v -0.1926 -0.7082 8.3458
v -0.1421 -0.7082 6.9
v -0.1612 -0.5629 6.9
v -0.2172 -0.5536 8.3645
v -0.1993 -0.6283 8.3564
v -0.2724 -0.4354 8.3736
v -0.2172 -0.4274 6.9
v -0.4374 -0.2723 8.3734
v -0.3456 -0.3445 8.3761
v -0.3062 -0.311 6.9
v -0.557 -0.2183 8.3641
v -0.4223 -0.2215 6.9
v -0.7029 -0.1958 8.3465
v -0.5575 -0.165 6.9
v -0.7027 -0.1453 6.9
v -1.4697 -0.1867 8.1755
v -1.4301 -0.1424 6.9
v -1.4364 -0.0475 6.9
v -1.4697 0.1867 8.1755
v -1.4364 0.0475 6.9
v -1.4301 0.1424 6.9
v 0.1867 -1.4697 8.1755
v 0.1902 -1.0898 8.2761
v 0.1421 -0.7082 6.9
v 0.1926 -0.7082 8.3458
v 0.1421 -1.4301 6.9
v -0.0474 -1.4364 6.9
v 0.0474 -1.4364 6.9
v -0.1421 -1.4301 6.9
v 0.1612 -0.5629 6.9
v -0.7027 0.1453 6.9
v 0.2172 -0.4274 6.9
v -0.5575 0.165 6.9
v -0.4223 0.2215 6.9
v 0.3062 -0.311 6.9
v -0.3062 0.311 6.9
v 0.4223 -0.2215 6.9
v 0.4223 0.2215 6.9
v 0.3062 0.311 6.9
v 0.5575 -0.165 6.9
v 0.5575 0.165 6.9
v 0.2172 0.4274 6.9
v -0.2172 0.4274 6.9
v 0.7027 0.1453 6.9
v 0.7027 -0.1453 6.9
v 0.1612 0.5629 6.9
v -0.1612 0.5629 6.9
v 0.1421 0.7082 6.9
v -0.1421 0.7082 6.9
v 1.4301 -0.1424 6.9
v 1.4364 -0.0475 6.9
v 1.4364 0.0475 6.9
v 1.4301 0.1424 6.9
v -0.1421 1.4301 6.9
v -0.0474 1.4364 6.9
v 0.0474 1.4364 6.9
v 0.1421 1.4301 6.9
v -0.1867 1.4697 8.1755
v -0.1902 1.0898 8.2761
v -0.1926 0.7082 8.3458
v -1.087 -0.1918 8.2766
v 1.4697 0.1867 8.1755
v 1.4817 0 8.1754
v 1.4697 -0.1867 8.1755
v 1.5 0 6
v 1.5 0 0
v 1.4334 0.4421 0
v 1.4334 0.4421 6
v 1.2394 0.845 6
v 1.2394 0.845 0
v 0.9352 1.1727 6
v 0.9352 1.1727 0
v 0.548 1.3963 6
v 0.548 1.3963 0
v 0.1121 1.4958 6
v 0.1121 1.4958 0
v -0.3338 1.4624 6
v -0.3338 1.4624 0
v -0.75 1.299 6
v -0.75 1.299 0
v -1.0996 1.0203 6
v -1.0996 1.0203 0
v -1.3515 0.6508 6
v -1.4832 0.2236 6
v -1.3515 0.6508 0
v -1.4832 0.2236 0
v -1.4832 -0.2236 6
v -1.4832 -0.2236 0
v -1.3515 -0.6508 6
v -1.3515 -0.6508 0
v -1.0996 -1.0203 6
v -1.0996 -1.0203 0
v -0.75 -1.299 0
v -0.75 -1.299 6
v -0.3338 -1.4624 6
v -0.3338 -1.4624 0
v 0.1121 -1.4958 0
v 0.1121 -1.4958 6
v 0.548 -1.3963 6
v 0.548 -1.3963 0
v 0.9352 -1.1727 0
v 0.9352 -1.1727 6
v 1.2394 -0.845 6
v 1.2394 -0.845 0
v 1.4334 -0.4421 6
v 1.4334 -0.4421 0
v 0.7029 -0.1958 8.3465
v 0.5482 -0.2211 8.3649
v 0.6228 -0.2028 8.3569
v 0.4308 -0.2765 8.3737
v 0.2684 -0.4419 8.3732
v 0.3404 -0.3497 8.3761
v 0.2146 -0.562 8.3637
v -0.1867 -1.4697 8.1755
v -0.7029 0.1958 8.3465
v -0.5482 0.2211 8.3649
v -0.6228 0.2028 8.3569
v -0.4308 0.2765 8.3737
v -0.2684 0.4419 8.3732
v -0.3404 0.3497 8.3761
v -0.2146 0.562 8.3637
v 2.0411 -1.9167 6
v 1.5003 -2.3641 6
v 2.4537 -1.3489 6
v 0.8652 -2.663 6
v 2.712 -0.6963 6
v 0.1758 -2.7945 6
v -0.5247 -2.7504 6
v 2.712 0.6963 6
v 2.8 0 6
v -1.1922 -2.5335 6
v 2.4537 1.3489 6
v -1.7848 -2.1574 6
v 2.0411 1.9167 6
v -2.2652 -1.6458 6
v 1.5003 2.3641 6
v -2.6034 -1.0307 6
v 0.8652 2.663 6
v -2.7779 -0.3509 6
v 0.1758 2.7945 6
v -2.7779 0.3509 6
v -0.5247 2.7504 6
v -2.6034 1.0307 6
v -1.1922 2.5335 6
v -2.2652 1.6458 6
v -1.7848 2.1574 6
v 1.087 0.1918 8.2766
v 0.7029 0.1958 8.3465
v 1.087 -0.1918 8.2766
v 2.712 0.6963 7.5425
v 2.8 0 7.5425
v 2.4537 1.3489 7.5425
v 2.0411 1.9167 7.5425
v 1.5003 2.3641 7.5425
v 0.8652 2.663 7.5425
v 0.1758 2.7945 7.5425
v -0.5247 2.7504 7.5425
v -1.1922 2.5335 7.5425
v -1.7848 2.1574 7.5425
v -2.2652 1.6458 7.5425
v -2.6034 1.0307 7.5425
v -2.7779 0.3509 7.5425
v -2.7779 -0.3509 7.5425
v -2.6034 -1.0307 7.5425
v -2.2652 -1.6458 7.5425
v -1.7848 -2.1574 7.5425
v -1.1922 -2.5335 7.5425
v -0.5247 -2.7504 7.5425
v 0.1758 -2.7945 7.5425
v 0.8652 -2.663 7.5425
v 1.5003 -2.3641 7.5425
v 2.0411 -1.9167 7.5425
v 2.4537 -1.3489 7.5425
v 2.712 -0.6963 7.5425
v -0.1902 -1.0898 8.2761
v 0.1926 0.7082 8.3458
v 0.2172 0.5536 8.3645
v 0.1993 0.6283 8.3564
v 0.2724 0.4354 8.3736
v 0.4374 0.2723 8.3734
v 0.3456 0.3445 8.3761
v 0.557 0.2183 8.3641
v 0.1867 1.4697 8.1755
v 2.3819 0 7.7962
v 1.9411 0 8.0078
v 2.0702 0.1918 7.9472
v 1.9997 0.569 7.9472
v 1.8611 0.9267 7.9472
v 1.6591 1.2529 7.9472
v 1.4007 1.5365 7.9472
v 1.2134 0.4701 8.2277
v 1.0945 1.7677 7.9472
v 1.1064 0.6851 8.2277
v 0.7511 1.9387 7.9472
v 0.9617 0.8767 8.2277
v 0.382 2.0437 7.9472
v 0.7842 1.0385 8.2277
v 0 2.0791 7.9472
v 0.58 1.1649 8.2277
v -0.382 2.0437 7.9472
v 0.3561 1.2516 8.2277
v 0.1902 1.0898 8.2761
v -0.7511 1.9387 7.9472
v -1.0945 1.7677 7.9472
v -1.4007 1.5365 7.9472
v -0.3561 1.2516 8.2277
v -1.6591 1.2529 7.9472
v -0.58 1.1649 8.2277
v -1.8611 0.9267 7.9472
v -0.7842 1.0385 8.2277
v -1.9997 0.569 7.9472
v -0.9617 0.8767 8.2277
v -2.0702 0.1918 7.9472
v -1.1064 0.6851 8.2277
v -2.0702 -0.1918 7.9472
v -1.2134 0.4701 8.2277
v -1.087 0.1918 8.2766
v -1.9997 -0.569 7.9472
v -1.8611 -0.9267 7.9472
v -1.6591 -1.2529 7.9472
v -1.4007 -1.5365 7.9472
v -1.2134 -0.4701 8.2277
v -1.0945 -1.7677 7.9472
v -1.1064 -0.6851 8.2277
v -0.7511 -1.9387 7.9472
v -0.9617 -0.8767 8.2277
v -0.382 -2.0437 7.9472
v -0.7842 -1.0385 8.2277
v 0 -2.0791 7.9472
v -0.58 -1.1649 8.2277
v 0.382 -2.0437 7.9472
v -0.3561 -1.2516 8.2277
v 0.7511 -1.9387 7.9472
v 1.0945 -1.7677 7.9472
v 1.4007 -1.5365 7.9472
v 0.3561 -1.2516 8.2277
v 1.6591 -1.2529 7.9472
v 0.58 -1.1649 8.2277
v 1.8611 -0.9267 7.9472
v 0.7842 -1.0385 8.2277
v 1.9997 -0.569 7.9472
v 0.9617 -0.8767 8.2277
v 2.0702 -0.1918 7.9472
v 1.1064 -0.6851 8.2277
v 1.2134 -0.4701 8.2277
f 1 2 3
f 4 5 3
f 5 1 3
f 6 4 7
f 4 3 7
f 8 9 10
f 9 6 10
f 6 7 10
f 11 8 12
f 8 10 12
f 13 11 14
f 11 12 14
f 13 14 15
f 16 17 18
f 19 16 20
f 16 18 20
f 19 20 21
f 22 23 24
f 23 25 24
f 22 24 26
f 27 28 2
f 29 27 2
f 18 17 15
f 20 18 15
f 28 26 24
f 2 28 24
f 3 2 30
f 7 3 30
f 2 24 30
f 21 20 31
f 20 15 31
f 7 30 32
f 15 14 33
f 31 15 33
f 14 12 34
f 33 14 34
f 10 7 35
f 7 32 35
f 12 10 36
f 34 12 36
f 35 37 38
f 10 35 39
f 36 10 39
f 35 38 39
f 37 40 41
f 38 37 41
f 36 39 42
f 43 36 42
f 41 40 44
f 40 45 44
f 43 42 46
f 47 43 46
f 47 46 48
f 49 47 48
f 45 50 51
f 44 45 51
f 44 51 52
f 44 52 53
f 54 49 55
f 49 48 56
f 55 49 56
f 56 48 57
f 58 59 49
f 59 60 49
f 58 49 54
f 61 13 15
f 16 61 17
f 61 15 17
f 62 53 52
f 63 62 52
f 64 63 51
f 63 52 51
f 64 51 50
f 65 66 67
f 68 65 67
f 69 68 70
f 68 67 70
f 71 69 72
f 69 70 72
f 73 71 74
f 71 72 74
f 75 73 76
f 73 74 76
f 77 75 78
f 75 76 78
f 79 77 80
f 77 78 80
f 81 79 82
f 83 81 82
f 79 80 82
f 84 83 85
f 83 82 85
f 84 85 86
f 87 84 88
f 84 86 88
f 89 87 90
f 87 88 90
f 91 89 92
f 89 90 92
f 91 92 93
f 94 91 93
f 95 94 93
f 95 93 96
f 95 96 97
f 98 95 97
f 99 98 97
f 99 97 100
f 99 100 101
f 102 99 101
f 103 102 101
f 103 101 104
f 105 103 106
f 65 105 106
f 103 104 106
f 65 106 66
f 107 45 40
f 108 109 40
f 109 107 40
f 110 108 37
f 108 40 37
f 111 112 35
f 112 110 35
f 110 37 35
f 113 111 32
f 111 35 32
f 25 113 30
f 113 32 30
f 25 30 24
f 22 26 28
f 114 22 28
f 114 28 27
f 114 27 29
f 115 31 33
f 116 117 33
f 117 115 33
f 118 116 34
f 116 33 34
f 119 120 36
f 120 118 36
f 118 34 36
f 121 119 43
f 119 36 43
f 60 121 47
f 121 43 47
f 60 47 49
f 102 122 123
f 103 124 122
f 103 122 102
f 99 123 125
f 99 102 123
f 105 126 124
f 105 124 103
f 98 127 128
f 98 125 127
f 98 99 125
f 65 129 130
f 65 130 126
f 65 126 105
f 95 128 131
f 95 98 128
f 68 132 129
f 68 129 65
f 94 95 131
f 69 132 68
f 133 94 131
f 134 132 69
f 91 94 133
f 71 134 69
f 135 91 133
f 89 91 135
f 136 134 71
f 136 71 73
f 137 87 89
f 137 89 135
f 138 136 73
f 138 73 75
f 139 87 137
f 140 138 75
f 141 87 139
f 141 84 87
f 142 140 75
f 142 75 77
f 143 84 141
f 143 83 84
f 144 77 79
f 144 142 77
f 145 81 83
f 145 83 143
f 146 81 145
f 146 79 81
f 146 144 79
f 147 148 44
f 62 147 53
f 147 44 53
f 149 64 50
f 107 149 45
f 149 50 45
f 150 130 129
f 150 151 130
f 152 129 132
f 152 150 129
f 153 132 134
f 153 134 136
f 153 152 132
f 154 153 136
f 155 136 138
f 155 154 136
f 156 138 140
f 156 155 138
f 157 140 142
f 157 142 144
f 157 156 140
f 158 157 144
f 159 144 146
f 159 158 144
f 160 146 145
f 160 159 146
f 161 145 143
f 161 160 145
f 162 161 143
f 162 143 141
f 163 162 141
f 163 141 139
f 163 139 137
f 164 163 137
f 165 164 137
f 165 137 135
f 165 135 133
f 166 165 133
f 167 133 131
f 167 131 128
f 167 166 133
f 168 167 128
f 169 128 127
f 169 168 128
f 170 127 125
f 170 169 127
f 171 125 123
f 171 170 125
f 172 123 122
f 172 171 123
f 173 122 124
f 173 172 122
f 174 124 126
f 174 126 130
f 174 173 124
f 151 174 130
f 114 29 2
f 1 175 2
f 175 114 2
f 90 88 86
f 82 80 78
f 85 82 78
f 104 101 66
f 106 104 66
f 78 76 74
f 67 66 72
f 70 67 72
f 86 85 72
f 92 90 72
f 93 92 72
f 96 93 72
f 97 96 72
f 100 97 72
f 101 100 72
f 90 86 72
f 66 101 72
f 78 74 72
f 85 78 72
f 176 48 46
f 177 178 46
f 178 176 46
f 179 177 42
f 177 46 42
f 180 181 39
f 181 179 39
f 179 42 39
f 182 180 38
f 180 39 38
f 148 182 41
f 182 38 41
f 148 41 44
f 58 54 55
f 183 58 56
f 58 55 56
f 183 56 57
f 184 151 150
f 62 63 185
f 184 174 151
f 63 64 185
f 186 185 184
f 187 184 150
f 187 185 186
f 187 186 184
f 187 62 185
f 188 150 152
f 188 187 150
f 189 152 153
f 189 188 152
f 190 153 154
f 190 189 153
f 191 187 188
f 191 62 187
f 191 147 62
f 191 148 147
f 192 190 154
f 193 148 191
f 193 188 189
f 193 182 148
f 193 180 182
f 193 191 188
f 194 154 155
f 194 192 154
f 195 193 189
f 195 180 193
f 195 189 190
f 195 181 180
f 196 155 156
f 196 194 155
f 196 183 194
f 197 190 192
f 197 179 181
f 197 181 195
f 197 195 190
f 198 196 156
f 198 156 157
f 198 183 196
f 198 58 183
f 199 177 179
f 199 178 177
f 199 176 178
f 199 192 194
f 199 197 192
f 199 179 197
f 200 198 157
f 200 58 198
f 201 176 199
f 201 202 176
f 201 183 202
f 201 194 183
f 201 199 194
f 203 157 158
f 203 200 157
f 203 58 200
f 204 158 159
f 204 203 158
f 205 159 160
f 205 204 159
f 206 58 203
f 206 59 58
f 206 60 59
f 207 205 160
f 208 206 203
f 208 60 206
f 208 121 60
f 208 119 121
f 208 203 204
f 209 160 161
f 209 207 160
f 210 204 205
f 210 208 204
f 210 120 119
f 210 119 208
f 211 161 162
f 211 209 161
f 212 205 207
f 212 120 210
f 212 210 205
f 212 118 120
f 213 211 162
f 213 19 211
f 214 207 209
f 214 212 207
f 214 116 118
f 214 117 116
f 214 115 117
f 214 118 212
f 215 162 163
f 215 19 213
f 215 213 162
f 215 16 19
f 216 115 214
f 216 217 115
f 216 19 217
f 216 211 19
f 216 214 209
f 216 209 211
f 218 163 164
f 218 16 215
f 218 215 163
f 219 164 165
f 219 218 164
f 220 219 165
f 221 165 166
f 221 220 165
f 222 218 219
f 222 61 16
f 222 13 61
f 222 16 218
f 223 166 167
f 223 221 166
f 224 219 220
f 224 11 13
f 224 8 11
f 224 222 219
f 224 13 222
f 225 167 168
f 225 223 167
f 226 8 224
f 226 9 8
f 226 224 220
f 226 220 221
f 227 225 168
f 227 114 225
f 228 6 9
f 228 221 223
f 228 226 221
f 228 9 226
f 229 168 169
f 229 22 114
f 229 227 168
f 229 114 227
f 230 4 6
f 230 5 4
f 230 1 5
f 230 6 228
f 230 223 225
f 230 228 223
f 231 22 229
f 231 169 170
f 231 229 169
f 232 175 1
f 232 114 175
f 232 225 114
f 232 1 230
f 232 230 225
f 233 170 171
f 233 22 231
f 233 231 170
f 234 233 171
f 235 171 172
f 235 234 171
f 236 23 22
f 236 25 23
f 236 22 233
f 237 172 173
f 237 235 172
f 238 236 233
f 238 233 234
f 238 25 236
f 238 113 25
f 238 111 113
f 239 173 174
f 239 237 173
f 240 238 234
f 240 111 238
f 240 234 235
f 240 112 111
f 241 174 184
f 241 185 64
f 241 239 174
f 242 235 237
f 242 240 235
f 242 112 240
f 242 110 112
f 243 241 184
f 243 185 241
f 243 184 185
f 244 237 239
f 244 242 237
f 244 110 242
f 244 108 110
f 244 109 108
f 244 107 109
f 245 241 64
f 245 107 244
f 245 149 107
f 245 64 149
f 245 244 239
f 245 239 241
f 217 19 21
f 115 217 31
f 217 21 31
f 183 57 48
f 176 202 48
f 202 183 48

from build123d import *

# Parameters (mm, degrees)
SKETCH1_R          = 1.5
BASE_EXTRUDE_DEPTH = 6
CUT_EXTRUDE1_DEPTH = 1.799999969
CUT_EXTRUDE1_TAPER = 2


with BuildPart() as part:
    # Sketch1 → Base-Extrude (new body)
    with BuildSketch(Plane.XY):
        Circle(SKETCH1_R)
    extrude(amount=BASE_EXTRUDE_DEPTH)

    # Sketch6 → Boss-Revolve2 (revolve)
    with BuildSketch(Plane(origin=(0, 0, 0), x_dir=(1, 0, 0), z_dir=(0, 1, 0))):
        with BuildLine():
            Line((0, -6), (2.7999999, -6))
            Line((2.7999999, -6), (2.7999999, -7.54246308))
            ThreePointArc((2.7999999, -7.54246308), (1.46418655, -8.180811406), (0, -8.4))
            Line((0, -8.4), (0, -6))
        make_face()
    revolve(axis=Axis((0, 0, -0.393620135), (0, 0, 1)))

    # Sketch7 → Cut-Extrude1 (cut)
    with BuildSketch(Plane(origin=(0, 0, 8.7000001), x_dir=(-1, 0, 0), z_dir=(0, 0, -1))):
        with BuildLine():
            ThreePointArc((0.205000004, 1.48592565), (0, 1.500000013), (-0.205000004, 1.48592565))
            Line((-0.205000004, 1.48592565), (-0.205000004, 0.708178558))
            ThreePointArc((-0.205000004, 0.708178558), (-0.35072876, 0.355344481), (-0.702967546, 0.208182689))
            Line((-0.702967546, 0.208182689), (-1.48592565, 0.205000004))
            ThreePointArc((-1.48592565, 0.205000004), (-1.500000013, 0), (-1.48592565, -0.205000004))
            Line((-1.48592565, -0.205000004), (-0.702967546, -0.208182689))
            ThreePointArc((-0.702967546, -0.208182689), (-0.35072876, -0.355344481), (-0.205000004, -0.708178558))
            Line((-0.205000004, -0.708178558), (-0.205000004, -1.48592565))
            ThreePointArc((-0.205000004, -1.48592565), (0, -1.500000013), (0.205000004, -1.48592565))
            Line((0.205000004, -1.48592565), (0.205000004, -0.708178558))
            ThreePointArc((0.205000004, -0.708178558), (0.35072876, -0.355344481), (0.702967546, -0.208182689))
            Line((0.702967546, -0.208182689), (1.48592565, -0.205000004))
            ThreePointArc((1.48592565, -0.205000004), (1.500000013, 0), (1.48592565, 0.205000004))
            Line((1.48592565, 0.205000004), (0.702967546, 0.208182689))
            ThreePointArc((0.702967546, 0.208182689), (0.35072876, 0.355344481), (0.205000004, 0.708178558))
            Line((0.205000004, 0.708178558), (0.205000004, 1.48592565))
        make_face()
    extrude(amount=CUT_EXTRUDE1_DEPTH, taper=CUT_EXTRUDE1_TAPER, mode=Mode.SUBTRACT)


solid = part.part
